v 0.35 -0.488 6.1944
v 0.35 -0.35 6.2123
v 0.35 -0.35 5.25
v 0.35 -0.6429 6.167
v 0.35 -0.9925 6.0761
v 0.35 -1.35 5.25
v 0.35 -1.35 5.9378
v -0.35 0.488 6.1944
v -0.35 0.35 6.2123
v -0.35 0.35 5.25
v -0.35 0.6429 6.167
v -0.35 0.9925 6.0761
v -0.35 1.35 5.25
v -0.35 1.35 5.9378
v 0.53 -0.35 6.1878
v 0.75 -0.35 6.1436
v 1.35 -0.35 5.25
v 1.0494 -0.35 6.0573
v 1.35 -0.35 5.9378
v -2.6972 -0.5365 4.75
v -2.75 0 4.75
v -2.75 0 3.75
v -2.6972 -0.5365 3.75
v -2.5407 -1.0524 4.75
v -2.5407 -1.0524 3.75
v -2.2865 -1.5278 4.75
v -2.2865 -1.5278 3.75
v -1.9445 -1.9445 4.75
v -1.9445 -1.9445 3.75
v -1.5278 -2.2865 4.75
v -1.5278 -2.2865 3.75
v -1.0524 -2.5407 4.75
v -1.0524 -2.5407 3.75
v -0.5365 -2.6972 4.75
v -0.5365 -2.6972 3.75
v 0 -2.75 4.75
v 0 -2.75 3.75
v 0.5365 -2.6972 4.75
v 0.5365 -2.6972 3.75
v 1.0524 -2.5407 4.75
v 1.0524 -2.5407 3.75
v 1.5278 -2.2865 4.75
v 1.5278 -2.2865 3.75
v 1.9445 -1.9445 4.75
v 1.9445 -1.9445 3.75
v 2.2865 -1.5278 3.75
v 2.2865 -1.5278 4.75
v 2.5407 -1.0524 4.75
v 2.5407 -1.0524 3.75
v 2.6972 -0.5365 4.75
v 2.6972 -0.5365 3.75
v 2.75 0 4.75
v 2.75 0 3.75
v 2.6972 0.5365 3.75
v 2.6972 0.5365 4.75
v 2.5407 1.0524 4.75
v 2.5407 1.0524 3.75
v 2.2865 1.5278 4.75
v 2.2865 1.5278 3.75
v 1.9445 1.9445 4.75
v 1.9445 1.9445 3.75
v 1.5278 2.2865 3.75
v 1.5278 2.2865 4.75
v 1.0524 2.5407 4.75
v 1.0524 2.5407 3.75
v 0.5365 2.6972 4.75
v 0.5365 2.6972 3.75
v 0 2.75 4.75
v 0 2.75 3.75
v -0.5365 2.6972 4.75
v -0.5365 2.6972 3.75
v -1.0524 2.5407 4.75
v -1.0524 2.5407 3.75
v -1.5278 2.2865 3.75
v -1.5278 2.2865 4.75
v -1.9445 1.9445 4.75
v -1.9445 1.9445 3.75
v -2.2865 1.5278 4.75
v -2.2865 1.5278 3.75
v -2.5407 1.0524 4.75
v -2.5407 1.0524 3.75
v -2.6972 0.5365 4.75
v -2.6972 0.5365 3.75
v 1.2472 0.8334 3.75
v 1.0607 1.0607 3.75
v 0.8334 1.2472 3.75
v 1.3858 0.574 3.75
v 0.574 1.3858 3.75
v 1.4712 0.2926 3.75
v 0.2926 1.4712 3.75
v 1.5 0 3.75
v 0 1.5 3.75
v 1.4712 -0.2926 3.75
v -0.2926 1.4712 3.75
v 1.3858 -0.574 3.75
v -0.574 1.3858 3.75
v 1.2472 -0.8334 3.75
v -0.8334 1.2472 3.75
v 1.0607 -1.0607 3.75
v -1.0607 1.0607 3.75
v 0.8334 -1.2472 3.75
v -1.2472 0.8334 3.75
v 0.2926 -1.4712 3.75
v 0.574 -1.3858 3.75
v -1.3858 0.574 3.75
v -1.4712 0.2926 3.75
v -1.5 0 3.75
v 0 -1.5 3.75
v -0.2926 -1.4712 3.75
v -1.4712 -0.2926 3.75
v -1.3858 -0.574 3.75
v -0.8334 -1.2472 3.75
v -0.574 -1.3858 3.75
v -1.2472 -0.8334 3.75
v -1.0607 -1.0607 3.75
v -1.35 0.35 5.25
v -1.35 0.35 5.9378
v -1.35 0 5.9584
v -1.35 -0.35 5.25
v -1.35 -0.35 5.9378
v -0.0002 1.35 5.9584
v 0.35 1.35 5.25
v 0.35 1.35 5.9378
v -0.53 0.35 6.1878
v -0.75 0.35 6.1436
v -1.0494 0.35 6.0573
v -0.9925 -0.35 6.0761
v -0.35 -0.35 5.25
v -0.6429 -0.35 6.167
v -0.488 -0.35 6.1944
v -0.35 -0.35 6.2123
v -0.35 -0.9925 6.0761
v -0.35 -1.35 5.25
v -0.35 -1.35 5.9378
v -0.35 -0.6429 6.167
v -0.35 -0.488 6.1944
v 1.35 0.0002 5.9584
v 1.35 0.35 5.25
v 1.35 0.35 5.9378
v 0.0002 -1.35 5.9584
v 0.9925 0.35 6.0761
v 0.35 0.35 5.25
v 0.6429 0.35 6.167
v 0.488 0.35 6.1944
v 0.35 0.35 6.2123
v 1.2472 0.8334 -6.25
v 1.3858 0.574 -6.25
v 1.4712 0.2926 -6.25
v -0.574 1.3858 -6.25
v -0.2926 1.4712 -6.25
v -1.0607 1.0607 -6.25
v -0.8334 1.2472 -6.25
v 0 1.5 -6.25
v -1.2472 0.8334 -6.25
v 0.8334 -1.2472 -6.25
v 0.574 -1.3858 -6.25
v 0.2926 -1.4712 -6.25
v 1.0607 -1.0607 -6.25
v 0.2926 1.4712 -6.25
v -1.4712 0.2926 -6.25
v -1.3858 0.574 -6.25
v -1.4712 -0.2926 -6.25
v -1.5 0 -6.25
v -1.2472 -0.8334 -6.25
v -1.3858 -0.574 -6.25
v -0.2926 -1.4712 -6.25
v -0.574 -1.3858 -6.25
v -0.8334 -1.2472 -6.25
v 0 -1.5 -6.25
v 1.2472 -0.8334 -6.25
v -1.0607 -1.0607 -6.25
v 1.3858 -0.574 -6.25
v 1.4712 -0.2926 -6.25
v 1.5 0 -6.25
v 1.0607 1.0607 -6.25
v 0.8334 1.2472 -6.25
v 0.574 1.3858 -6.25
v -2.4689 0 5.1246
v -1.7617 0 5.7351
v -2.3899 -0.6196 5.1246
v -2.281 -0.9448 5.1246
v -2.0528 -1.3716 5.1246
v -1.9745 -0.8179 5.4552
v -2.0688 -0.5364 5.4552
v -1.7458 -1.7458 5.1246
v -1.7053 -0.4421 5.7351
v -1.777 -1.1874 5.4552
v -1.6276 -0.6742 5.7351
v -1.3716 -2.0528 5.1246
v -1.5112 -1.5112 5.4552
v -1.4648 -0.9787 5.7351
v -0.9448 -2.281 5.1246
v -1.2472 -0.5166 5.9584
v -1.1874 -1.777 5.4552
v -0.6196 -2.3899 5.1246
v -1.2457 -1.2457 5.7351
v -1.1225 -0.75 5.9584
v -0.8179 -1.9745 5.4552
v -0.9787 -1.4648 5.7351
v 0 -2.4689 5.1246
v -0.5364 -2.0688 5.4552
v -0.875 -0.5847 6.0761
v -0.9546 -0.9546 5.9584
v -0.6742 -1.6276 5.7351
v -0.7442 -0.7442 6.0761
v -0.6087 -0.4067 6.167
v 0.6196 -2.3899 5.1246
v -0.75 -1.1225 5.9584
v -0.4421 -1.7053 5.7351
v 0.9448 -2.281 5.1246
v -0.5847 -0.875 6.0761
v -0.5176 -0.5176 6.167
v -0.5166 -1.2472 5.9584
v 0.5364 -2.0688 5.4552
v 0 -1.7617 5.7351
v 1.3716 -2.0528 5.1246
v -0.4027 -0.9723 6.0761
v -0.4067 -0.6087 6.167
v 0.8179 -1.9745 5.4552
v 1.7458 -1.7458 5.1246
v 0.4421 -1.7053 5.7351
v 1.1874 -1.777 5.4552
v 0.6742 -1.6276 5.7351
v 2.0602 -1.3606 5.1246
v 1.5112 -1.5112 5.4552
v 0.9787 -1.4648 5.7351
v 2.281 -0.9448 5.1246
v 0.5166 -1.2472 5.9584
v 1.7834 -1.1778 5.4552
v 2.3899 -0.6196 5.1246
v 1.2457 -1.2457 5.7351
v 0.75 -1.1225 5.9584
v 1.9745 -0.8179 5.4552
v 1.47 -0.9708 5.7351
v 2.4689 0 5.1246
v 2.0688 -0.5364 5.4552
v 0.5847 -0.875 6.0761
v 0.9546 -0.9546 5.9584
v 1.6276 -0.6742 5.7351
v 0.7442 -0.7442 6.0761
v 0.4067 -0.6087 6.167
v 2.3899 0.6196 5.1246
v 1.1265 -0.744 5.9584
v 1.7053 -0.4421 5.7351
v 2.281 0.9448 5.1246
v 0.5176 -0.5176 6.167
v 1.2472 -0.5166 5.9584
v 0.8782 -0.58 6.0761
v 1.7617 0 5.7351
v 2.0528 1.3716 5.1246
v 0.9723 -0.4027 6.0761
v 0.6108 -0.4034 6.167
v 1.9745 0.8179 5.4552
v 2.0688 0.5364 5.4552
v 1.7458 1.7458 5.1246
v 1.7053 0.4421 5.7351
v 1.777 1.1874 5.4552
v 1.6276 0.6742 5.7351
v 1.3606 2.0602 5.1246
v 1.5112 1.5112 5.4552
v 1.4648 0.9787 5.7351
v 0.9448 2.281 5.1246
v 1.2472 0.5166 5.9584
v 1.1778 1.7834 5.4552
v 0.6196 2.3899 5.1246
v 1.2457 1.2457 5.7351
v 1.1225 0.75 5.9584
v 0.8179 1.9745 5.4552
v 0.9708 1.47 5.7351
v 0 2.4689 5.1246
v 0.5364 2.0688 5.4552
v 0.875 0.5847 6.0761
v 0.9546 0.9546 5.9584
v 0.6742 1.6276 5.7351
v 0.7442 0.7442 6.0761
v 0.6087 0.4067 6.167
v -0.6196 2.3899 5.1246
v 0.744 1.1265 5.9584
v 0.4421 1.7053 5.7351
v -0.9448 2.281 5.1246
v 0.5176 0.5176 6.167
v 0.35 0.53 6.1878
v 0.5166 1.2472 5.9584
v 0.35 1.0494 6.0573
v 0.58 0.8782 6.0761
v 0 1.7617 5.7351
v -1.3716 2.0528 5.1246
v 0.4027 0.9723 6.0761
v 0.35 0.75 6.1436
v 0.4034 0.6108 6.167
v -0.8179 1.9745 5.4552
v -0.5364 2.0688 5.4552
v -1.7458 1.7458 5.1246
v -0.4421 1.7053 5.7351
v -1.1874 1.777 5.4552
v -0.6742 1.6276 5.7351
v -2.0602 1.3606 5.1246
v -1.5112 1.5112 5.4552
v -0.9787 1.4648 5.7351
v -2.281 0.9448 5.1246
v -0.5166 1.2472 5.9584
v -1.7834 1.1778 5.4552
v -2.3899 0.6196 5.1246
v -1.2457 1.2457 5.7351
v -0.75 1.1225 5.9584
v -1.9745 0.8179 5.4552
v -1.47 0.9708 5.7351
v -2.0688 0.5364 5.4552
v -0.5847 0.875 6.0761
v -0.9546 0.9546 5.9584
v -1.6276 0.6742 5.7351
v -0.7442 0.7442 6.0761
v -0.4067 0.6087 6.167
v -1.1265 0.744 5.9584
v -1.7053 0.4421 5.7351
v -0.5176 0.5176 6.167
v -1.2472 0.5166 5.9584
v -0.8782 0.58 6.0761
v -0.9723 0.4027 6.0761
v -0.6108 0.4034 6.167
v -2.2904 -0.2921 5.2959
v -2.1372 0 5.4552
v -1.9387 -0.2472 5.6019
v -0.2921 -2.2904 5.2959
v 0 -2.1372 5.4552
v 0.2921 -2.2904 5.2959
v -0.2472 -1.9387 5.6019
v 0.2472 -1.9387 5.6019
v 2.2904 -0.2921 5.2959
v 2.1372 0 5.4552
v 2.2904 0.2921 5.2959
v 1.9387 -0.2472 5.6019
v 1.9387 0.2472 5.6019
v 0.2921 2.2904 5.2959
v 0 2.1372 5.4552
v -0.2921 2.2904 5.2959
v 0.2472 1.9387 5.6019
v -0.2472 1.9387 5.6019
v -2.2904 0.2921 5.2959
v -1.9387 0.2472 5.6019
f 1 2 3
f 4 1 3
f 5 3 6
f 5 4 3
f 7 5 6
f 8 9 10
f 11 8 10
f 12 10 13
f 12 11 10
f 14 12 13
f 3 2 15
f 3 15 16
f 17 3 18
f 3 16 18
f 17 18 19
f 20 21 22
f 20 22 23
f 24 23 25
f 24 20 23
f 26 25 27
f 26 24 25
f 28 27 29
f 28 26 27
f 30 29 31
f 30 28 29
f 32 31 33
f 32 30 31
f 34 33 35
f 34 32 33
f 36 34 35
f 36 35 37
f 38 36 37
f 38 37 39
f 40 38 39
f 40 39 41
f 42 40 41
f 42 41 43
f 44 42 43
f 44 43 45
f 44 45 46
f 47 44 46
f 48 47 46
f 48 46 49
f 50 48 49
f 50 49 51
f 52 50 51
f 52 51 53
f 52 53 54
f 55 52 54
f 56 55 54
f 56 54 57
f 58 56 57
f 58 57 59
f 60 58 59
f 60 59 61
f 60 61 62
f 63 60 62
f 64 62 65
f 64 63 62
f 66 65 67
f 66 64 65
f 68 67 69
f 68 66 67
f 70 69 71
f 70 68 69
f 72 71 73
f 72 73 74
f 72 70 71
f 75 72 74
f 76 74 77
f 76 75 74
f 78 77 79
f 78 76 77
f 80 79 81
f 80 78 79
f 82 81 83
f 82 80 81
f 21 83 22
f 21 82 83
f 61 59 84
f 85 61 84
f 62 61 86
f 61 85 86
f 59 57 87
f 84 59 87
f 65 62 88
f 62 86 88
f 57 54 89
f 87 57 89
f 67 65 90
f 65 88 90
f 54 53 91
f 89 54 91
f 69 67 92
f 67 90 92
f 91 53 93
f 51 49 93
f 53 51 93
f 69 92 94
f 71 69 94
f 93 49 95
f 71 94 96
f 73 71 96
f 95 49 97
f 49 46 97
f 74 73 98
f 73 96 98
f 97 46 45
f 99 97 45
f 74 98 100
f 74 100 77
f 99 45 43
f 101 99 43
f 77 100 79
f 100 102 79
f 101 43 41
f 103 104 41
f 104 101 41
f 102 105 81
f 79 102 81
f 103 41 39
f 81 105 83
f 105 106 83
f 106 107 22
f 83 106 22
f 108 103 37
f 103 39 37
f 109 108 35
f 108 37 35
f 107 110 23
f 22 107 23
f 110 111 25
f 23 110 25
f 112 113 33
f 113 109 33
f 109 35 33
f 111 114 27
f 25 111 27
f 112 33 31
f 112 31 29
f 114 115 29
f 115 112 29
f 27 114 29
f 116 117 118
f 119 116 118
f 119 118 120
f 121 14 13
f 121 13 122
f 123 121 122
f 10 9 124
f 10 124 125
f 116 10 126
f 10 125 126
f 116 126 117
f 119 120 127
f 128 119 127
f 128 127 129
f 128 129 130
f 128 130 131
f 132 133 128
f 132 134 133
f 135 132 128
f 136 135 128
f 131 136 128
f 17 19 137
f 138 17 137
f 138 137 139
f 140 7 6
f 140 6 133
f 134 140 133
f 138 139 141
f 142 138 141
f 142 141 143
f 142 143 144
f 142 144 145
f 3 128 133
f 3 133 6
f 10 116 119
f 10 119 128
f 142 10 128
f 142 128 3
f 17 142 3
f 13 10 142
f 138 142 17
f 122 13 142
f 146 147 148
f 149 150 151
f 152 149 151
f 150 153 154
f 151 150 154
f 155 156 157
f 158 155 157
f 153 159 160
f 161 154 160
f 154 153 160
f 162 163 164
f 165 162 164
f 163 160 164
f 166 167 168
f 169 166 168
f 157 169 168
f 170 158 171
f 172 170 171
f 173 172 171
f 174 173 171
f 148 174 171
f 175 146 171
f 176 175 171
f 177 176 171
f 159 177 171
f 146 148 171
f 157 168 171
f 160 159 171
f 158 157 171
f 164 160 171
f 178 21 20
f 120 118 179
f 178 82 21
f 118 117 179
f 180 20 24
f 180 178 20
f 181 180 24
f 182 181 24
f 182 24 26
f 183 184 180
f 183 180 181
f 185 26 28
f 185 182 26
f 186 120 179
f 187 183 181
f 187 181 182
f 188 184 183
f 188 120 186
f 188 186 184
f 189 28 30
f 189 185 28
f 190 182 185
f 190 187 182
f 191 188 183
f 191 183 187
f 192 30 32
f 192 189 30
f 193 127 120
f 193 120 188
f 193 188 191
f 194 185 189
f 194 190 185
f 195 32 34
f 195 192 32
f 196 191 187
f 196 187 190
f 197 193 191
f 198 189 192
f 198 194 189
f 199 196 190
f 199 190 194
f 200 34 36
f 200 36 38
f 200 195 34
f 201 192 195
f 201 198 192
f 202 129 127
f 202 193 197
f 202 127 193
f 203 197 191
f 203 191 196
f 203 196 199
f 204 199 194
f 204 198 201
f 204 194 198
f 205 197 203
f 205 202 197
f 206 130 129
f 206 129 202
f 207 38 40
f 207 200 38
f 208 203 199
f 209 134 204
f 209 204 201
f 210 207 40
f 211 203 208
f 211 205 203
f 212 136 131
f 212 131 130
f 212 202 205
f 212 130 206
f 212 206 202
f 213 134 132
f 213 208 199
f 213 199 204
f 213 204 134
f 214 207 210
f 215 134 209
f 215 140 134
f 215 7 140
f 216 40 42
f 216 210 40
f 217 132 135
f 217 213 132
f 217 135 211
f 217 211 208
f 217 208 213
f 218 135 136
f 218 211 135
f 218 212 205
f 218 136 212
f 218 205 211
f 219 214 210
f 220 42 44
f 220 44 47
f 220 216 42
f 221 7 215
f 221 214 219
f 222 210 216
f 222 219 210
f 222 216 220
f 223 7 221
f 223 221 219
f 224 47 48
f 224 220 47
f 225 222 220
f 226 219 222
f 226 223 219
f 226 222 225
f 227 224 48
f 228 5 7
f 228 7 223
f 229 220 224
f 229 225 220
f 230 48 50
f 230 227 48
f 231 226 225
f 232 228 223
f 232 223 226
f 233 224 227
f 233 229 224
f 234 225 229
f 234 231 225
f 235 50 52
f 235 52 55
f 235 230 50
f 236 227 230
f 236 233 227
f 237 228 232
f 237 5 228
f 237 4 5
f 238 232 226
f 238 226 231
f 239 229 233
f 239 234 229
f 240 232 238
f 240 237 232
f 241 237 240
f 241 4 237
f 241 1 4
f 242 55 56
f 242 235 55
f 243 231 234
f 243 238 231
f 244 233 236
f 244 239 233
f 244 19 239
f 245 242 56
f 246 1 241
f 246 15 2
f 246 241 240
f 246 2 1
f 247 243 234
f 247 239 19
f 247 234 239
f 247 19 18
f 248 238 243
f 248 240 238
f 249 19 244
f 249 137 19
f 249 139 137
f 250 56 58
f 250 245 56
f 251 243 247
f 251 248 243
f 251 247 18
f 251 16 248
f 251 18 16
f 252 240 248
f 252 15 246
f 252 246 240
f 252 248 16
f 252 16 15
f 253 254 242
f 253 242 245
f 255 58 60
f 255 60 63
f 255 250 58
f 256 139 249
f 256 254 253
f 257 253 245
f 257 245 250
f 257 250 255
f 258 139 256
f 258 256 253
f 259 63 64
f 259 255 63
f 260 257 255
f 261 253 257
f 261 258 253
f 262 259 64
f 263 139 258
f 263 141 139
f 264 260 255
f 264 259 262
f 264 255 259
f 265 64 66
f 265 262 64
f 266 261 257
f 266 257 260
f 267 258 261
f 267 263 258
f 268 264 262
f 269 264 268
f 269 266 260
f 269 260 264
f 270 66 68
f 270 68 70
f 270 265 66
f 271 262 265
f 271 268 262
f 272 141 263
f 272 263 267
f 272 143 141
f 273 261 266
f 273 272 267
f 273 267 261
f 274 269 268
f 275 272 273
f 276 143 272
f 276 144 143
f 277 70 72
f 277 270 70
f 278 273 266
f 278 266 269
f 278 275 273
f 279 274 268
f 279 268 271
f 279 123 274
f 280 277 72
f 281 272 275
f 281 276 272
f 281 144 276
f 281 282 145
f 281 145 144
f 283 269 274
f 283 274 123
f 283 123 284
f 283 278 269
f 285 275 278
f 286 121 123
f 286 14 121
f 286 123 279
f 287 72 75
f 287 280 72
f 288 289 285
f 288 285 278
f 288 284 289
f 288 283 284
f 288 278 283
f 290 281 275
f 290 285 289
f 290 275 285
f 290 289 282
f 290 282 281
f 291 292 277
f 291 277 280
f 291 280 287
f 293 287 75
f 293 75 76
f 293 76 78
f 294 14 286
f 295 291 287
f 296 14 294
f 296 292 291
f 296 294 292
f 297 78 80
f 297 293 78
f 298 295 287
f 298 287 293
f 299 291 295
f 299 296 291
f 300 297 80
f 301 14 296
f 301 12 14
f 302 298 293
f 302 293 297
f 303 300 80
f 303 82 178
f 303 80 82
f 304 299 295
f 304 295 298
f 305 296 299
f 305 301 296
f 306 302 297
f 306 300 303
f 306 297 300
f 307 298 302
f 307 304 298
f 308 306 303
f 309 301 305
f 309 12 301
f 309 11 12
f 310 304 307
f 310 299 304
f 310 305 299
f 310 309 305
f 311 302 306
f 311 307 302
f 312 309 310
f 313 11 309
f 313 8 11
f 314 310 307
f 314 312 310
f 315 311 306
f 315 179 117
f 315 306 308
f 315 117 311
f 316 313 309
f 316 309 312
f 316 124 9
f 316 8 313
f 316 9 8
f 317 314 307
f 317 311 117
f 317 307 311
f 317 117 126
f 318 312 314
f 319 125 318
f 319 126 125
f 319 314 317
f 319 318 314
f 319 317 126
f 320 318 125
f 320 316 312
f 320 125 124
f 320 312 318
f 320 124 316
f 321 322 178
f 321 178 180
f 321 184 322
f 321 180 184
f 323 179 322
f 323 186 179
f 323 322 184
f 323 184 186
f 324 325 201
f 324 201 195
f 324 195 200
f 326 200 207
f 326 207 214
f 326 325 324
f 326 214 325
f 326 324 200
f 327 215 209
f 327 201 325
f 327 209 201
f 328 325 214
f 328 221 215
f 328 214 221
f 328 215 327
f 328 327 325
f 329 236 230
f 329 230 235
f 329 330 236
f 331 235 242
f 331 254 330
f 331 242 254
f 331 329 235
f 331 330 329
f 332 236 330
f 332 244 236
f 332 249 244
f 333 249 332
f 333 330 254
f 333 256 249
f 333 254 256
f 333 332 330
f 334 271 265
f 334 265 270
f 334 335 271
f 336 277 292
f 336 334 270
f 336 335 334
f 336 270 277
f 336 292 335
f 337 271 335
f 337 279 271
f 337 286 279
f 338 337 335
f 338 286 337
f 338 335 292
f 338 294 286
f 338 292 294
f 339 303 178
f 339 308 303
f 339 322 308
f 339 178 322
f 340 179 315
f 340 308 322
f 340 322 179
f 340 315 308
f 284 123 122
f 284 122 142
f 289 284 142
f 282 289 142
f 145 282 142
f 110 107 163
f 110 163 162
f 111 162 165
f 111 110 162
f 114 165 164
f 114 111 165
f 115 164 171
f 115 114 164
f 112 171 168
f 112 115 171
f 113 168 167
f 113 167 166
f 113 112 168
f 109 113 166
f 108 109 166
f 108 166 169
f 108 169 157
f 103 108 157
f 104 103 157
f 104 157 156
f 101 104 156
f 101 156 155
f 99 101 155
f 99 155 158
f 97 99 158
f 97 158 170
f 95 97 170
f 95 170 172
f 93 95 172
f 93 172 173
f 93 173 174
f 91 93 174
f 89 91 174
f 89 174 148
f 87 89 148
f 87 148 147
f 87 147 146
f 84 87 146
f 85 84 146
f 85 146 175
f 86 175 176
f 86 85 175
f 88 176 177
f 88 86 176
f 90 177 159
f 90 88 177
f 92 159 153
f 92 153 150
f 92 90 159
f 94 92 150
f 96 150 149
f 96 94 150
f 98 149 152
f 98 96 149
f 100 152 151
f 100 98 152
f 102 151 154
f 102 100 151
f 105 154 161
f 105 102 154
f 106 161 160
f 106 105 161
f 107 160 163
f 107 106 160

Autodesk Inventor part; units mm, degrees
ref_plane "YZ Plane" through (0, 0, 0) normal (1, 0, 0) x (0, 1, 0)
ref_plane "XZ Plane" through (0, 0, 0) normal (0, 1, 0) x (-1, 0, 0)
sketch "Sketch1" plane through (0, 0, 0) normal (0, 1, 0) x (-1, 0, 0)
  line L0 (0, -8.8201) -> (0, 9.1707) projected
  line L1 (0, -6.25) -> (0, 6.25)
  line L2 (0, -6.25) -> (1.5, -6.25)
  line L3 (1.5, -6.25) -> (1.5, 3.75)
  line L4 (1.5, 3.75) -> (2.75, 3.75)
  line L5 (2.75, 3.75) -> (2.75, 4.75)
  arc A0 (2.75, 4.75) -> (0, 6.25) centre (0, 2.9792) ccw
  line L6 (3.5295, 0) -> (-0.5882, 0) projected
  point P0 (0, 0)
  dimension "d0" = 10
  dimension "d1" = 3
  dimension "d2" = 2.5
  dimension "d3" = 5.5
  dimension "d4" = 1
revolve "Revolution1" add sketch "Sketch1" angle 360 about axis through (0, 0, -10) along (0, 0, 1)
ref_plane "Work Plane1" through (0, 0, 6.25) normal (0, 0, 1) x (1, 0, 0)
sketch "Sketch2" plane through (0, 0, 6.25) normal (0, 0, 1) x (1, 0, 0)
  line L0 (-1.35, -0.35) -> (1.35, -0.35)
  line L1 (1.35, -0.35) -> (1.35, 0.35)
  line L2 (1.35, 0.35) -> (-1.35, 0.35)
  line L3 (-1.35, 0.35) -> (-1.35, -0.35)
  line L4 (-1.35, -0.35) -> (1.35, 0.35) construction
  line L5 (1.35, -0.35) -> (-1.35, 0.35) construction
  line L6 (0.35, -1.35) -> (-0.35, -1.35)
  line L7 (-0.35, -1.35) -> (-0.35, 1.35)
  line L8 (-0.35, 1.35) -> (0.35, 1.35)
  line L9 (0.35, 1.35) -> (0.35, -1.35)
  line L10 (0.35, -1.35) -> (-0.35, 1.35) construction
  line L11 (-0.35, -1.35) -> (0.35, 1.35) construction
  point P0 (0, 0)
  dimension "d6" = 2.7
  dimension "d7" = 0.7
extrude "Extrusion1" cut sketch "Sketch2" against normal blind 1
thread "Thread1" size "M3x0.5" class "6g" standard "ANSI Metric M Profile" full length
properties part number "empty"
